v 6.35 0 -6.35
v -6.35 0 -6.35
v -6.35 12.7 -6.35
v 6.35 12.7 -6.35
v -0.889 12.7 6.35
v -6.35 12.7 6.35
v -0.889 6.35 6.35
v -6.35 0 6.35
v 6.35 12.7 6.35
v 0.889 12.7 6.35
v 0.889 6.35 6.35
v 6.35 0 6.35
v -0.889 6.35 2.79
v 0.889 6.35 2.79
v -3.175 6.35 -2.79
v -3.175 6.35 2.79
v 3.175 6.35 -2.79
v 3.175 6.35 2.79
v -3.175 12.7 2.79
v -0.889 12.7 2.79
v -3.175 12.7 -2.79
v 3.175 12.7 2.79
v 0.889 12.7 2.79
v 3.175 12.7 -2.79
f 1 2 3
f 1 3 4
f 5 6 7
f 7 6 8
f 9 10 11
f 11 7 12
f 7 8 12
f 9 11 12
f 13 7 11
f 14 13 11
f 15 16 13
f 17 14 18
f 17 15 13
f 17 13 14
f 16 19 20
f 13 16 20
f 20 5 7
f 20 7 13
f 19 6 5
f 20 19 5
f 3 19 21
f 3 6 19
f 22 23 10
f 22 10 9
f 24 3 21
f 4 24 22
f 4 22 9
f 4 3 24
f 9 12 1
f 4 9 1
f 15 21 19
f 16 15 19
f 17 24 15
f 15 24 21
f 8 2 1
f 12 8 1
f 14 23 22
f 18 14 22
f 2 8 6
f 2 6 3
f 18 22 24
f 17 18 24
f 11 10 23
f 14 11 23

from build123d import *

# Parameters (mm, degrees)
SKETCH1_W           = 12.7
SKETCH1_H           = 12.7
BOSS_EXTRUDE1_DEPTH = 12.7
SKETCH2_W           = 1.778
SKETCH2_H           = 3.560002412
CUT_EXTRUDE1_DEPTH  = 6.35


with BuildPart() as part:
    # Sketch1 → Boss-Extrude1 (new body)
    with BuildSketch(Plane(origin=(0, 0, 0), x_dir=(1, 0, 0), z_dir=(0, 1, 0))):
        Rectangle(SKETCH1_W, SKETCH1_H)
    extrude(amount=BOSS_EXTRUDE1_DEPTH)

    # Sketch2 → Cut-Extrude1 (cut)
    with BuildSketch(Plane(origin=(0, 12.7, 0), x_dir=(1, 0, 0), z_dir=(0, 1, 0))):
        Polygon((-3.175, -2.789997588), (-0.889, -2.789997588), (0.889, -2.789997588), (3.175, -2.789997588), (3.175, 2.789997588), (-3.175, 2.789997588), align=None)
        with Locations((0, -4.569998794)):
            Rectangle(SKETCH2_W, SKETCH2_H)
    extrude(amount=-CUT_EXTRUDE1_DEPTH, mode=Mode.SUBTRACT)


solid = part.part
